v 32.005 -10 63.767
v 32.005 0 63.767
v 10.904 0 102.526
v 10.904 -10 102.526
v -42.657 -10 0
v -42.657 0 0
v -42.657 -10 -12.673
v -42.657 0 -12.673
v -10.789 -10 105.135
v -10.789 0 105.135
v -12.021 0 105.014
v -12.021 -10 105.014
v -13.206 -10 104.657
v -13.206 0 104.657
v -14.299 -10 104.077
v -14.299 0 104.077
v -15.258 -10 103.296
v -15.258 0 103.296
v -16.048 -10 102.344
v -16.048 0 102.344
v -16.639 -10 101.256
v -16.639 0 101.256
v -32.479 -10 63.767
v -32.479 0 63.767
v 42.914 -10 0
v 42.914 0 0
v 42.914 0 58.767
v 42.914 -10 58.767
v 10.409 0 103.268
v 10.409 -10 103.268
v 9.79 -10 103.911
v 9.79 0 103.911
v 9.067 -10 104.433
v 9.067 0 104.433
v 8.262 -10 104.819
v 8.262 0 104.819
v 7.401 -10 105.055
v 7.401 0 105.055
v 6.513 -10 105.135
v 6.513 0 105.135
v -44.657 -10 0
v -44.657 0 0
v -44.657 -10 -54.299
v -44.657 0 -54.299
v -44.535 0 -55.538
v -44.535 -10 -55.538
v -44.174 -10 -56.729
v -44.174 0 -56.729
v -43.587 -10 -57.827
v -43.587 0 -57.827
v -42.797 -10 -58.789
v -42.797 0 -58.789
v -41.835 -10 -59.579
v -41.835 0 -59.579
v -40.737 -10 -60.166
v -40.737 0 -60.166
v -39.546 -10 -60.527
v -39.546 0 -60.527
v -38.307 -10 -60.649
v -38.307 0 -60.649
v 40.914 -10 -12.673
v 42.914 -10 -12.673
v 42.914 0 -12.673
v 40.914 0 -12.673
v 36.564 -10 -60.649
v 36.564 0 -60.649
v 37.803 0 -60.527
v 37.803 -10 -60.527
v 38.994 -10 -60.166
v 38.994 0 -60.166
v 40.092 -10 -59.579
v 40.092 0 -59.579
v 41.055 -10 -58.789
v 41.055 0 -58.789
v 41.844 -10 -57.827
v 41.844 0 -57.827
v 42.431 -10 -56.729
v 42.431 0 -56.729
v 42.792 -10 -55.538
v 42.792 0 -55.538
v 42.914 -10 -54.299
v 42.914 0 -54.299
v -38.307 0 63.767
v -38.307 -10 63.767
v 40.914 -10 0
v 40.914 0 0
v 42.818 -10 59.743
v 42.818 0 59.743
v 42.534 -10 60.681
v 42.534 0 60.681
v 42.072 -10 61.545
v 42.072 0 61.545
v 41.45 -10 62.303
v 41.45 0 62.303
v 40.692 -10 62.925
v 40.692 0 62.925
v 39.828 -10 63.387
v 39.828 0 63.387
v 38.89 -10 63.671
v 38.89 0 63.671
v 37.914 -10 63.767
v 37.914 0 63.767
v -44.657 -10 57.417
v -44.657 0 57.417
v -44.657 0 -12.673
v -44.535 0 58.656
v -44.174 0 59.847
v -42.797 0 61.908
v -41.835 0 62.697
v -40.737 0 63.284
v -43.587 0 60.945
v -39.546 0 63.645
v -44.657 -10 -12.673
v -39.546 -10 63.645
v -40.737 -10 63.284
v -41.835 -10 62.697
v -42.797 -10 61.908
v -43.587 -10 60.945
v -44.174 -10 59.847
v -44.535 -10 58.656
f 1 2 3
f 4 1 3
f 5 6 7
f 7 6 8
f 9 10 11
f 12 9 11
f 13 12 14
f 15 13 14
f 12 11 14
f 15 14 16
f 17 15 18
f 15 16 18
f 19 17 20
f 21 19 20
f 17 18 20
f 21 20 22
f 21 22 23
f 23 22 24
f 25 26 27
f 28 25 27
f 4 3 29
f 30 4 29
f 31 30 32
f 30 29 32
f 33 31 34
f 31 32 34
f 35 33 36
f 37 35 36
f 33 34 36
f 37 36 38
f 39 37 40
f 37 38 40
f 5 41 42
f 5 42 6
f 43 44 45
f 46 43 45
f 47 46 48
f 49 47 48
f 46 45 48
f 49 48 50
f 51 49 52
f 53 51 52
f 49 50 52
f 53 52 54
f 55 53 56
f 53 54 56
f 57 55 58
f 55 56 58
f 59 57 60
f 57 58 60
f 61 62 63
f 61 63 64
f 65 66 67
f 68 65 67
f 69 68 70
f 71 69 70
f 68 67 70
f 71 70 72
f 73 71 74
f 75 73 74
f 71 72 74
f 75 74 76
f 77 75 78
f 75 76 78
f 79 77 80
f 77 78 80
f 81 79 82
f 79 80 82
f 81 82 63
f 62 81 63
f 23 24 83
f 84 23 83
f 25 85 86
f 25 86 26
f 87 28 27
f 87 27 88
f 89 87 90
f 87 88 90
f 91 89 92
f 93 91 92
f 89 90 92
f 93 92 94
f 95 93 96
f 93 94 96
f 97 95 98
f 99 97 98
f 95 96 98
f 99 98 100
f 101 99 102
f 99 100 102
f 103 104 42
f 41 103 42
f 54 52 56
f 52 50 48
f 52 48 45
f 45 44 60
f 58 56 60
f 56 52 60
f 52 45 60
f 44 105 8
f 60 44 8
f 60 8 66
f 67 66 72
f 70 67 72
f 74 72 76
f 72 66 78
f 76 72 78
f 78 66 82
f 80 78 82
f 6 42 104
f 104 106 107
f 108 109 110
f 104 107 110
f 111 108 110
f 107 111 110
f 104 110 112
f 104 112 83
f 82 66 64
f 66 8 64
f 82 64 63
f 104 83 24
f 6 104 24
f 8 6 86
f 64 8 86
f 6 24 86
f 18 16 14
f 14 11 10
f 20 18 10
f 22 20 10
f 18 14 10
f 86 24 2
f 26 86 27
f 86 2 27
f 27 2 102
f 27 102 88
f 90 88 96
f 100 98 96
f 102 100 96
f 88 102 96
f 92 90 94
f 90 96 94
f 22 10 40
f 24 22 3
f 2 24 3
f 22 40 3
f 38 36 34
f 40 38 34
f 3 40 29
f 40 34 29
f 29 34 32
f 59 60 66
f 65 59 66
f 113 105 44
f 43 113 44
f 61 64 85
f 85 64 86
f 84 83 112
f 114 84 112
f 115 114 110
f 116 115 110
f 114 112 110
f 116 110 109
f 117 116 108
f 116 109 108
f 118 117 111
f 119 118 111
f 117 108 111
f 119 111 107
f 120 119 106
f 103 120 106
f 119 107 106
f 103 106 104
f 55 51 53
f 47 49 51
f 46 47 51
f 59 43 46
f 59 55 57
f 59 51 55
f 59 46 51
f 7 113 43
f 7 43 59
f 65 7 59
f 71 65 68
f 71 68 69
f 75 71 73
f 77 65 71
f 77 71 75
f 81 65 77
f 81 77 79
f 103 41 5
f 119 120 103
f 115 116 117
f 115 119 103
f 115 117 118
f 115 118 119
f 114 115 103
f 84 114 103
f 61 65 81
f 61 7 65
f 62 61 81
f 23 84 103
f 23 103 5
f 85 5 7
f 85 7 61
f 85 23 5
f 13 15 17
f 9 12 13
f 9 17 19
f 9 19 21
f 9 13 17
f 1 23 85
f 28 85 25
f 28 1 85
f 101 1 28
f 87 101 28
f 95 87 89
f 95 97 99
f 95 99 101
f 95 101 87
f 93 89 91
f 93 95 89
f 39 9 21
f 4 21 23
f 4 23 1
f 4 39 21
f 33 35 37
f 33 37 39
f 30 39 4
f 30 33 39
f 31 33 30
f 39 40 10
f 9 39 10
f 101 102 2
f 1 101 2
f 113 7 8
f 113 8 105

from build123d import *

# Parameters (mm, degrees)
F1_DEPTH = 10


with BuildPart() as f1:
    # F0 (on Front) → F1 (new body)
    with BuildSketch(Plane.XZ):
        with BuildLine():
            Line((6.51253, 105.134805), (0, 105.134805))
            Line((0, 105.134805), (-10.789488, 105.134805))
            ThreePointArc((-10.789488, 105.134805), (-14.298656, 104.077086), (-16.63878, 101.256299))
            Line((-16.63878, 101.256299), (-32.478897, 63.767443))
            Line((-32.478897, 63.767443), (-38.307014, 63.767443))
            ThreePointArc((-38.307014, 63.767443), (-42.797142, 61.907571), (-44.657014, 57.417443))
            Line((-44.657014, 57.417443), (-44.657014, 0))
            Line((-44.657014, 0), (-42.657014, 0))
            Line((-42.657014, 0), (-42.657014, -12.672931))
            Line((-42.657014, -12.672931), (-44.657014, -12.672931))
            Line((-44.657014, -12.672931), (-44.657014, -54.299037))
            ThreePointArc((-44.657014, -54.299037), (-42.797142, -58.789165), (-38.307014, -60.649037))
            Line((-38.307014, -60.649037), (0, -60.649037))
            Line((0, -60.649037), (36.564393, -60.649037))
            ThreePointArc((36.564393, -60.649037), (41.054521, -58.789165), (42.914393, -54.299037))
            Line((42.914393, -54.299037), (42.914393, -12.672931))
            Line((42.914393, -12.672931), (40.914393, -12.672931))
            Line((40.914393, -12.672931), (40.914393, 0))
            Line((40.914393, 0), (42.914393, 0))
            Line((42.914393, 0), (42.914393, 58.767443))
            ThreePointArc((42.914393, 58.767443), (41.449927, 62.302977), (37.914393, 63.767443))
            Line((37.914393, 63.767443), (32.005376, 63.767443))
            Line((32.005376, 63.767443), (10.90388, 102.52563))
            ThreePointArc((10.90388, 102.52563), (9.066535, 104.4333), (6.51253, 105.134805))
        make_face()
    extrude(amount=F1_DEPTH)


solid = f1.part
